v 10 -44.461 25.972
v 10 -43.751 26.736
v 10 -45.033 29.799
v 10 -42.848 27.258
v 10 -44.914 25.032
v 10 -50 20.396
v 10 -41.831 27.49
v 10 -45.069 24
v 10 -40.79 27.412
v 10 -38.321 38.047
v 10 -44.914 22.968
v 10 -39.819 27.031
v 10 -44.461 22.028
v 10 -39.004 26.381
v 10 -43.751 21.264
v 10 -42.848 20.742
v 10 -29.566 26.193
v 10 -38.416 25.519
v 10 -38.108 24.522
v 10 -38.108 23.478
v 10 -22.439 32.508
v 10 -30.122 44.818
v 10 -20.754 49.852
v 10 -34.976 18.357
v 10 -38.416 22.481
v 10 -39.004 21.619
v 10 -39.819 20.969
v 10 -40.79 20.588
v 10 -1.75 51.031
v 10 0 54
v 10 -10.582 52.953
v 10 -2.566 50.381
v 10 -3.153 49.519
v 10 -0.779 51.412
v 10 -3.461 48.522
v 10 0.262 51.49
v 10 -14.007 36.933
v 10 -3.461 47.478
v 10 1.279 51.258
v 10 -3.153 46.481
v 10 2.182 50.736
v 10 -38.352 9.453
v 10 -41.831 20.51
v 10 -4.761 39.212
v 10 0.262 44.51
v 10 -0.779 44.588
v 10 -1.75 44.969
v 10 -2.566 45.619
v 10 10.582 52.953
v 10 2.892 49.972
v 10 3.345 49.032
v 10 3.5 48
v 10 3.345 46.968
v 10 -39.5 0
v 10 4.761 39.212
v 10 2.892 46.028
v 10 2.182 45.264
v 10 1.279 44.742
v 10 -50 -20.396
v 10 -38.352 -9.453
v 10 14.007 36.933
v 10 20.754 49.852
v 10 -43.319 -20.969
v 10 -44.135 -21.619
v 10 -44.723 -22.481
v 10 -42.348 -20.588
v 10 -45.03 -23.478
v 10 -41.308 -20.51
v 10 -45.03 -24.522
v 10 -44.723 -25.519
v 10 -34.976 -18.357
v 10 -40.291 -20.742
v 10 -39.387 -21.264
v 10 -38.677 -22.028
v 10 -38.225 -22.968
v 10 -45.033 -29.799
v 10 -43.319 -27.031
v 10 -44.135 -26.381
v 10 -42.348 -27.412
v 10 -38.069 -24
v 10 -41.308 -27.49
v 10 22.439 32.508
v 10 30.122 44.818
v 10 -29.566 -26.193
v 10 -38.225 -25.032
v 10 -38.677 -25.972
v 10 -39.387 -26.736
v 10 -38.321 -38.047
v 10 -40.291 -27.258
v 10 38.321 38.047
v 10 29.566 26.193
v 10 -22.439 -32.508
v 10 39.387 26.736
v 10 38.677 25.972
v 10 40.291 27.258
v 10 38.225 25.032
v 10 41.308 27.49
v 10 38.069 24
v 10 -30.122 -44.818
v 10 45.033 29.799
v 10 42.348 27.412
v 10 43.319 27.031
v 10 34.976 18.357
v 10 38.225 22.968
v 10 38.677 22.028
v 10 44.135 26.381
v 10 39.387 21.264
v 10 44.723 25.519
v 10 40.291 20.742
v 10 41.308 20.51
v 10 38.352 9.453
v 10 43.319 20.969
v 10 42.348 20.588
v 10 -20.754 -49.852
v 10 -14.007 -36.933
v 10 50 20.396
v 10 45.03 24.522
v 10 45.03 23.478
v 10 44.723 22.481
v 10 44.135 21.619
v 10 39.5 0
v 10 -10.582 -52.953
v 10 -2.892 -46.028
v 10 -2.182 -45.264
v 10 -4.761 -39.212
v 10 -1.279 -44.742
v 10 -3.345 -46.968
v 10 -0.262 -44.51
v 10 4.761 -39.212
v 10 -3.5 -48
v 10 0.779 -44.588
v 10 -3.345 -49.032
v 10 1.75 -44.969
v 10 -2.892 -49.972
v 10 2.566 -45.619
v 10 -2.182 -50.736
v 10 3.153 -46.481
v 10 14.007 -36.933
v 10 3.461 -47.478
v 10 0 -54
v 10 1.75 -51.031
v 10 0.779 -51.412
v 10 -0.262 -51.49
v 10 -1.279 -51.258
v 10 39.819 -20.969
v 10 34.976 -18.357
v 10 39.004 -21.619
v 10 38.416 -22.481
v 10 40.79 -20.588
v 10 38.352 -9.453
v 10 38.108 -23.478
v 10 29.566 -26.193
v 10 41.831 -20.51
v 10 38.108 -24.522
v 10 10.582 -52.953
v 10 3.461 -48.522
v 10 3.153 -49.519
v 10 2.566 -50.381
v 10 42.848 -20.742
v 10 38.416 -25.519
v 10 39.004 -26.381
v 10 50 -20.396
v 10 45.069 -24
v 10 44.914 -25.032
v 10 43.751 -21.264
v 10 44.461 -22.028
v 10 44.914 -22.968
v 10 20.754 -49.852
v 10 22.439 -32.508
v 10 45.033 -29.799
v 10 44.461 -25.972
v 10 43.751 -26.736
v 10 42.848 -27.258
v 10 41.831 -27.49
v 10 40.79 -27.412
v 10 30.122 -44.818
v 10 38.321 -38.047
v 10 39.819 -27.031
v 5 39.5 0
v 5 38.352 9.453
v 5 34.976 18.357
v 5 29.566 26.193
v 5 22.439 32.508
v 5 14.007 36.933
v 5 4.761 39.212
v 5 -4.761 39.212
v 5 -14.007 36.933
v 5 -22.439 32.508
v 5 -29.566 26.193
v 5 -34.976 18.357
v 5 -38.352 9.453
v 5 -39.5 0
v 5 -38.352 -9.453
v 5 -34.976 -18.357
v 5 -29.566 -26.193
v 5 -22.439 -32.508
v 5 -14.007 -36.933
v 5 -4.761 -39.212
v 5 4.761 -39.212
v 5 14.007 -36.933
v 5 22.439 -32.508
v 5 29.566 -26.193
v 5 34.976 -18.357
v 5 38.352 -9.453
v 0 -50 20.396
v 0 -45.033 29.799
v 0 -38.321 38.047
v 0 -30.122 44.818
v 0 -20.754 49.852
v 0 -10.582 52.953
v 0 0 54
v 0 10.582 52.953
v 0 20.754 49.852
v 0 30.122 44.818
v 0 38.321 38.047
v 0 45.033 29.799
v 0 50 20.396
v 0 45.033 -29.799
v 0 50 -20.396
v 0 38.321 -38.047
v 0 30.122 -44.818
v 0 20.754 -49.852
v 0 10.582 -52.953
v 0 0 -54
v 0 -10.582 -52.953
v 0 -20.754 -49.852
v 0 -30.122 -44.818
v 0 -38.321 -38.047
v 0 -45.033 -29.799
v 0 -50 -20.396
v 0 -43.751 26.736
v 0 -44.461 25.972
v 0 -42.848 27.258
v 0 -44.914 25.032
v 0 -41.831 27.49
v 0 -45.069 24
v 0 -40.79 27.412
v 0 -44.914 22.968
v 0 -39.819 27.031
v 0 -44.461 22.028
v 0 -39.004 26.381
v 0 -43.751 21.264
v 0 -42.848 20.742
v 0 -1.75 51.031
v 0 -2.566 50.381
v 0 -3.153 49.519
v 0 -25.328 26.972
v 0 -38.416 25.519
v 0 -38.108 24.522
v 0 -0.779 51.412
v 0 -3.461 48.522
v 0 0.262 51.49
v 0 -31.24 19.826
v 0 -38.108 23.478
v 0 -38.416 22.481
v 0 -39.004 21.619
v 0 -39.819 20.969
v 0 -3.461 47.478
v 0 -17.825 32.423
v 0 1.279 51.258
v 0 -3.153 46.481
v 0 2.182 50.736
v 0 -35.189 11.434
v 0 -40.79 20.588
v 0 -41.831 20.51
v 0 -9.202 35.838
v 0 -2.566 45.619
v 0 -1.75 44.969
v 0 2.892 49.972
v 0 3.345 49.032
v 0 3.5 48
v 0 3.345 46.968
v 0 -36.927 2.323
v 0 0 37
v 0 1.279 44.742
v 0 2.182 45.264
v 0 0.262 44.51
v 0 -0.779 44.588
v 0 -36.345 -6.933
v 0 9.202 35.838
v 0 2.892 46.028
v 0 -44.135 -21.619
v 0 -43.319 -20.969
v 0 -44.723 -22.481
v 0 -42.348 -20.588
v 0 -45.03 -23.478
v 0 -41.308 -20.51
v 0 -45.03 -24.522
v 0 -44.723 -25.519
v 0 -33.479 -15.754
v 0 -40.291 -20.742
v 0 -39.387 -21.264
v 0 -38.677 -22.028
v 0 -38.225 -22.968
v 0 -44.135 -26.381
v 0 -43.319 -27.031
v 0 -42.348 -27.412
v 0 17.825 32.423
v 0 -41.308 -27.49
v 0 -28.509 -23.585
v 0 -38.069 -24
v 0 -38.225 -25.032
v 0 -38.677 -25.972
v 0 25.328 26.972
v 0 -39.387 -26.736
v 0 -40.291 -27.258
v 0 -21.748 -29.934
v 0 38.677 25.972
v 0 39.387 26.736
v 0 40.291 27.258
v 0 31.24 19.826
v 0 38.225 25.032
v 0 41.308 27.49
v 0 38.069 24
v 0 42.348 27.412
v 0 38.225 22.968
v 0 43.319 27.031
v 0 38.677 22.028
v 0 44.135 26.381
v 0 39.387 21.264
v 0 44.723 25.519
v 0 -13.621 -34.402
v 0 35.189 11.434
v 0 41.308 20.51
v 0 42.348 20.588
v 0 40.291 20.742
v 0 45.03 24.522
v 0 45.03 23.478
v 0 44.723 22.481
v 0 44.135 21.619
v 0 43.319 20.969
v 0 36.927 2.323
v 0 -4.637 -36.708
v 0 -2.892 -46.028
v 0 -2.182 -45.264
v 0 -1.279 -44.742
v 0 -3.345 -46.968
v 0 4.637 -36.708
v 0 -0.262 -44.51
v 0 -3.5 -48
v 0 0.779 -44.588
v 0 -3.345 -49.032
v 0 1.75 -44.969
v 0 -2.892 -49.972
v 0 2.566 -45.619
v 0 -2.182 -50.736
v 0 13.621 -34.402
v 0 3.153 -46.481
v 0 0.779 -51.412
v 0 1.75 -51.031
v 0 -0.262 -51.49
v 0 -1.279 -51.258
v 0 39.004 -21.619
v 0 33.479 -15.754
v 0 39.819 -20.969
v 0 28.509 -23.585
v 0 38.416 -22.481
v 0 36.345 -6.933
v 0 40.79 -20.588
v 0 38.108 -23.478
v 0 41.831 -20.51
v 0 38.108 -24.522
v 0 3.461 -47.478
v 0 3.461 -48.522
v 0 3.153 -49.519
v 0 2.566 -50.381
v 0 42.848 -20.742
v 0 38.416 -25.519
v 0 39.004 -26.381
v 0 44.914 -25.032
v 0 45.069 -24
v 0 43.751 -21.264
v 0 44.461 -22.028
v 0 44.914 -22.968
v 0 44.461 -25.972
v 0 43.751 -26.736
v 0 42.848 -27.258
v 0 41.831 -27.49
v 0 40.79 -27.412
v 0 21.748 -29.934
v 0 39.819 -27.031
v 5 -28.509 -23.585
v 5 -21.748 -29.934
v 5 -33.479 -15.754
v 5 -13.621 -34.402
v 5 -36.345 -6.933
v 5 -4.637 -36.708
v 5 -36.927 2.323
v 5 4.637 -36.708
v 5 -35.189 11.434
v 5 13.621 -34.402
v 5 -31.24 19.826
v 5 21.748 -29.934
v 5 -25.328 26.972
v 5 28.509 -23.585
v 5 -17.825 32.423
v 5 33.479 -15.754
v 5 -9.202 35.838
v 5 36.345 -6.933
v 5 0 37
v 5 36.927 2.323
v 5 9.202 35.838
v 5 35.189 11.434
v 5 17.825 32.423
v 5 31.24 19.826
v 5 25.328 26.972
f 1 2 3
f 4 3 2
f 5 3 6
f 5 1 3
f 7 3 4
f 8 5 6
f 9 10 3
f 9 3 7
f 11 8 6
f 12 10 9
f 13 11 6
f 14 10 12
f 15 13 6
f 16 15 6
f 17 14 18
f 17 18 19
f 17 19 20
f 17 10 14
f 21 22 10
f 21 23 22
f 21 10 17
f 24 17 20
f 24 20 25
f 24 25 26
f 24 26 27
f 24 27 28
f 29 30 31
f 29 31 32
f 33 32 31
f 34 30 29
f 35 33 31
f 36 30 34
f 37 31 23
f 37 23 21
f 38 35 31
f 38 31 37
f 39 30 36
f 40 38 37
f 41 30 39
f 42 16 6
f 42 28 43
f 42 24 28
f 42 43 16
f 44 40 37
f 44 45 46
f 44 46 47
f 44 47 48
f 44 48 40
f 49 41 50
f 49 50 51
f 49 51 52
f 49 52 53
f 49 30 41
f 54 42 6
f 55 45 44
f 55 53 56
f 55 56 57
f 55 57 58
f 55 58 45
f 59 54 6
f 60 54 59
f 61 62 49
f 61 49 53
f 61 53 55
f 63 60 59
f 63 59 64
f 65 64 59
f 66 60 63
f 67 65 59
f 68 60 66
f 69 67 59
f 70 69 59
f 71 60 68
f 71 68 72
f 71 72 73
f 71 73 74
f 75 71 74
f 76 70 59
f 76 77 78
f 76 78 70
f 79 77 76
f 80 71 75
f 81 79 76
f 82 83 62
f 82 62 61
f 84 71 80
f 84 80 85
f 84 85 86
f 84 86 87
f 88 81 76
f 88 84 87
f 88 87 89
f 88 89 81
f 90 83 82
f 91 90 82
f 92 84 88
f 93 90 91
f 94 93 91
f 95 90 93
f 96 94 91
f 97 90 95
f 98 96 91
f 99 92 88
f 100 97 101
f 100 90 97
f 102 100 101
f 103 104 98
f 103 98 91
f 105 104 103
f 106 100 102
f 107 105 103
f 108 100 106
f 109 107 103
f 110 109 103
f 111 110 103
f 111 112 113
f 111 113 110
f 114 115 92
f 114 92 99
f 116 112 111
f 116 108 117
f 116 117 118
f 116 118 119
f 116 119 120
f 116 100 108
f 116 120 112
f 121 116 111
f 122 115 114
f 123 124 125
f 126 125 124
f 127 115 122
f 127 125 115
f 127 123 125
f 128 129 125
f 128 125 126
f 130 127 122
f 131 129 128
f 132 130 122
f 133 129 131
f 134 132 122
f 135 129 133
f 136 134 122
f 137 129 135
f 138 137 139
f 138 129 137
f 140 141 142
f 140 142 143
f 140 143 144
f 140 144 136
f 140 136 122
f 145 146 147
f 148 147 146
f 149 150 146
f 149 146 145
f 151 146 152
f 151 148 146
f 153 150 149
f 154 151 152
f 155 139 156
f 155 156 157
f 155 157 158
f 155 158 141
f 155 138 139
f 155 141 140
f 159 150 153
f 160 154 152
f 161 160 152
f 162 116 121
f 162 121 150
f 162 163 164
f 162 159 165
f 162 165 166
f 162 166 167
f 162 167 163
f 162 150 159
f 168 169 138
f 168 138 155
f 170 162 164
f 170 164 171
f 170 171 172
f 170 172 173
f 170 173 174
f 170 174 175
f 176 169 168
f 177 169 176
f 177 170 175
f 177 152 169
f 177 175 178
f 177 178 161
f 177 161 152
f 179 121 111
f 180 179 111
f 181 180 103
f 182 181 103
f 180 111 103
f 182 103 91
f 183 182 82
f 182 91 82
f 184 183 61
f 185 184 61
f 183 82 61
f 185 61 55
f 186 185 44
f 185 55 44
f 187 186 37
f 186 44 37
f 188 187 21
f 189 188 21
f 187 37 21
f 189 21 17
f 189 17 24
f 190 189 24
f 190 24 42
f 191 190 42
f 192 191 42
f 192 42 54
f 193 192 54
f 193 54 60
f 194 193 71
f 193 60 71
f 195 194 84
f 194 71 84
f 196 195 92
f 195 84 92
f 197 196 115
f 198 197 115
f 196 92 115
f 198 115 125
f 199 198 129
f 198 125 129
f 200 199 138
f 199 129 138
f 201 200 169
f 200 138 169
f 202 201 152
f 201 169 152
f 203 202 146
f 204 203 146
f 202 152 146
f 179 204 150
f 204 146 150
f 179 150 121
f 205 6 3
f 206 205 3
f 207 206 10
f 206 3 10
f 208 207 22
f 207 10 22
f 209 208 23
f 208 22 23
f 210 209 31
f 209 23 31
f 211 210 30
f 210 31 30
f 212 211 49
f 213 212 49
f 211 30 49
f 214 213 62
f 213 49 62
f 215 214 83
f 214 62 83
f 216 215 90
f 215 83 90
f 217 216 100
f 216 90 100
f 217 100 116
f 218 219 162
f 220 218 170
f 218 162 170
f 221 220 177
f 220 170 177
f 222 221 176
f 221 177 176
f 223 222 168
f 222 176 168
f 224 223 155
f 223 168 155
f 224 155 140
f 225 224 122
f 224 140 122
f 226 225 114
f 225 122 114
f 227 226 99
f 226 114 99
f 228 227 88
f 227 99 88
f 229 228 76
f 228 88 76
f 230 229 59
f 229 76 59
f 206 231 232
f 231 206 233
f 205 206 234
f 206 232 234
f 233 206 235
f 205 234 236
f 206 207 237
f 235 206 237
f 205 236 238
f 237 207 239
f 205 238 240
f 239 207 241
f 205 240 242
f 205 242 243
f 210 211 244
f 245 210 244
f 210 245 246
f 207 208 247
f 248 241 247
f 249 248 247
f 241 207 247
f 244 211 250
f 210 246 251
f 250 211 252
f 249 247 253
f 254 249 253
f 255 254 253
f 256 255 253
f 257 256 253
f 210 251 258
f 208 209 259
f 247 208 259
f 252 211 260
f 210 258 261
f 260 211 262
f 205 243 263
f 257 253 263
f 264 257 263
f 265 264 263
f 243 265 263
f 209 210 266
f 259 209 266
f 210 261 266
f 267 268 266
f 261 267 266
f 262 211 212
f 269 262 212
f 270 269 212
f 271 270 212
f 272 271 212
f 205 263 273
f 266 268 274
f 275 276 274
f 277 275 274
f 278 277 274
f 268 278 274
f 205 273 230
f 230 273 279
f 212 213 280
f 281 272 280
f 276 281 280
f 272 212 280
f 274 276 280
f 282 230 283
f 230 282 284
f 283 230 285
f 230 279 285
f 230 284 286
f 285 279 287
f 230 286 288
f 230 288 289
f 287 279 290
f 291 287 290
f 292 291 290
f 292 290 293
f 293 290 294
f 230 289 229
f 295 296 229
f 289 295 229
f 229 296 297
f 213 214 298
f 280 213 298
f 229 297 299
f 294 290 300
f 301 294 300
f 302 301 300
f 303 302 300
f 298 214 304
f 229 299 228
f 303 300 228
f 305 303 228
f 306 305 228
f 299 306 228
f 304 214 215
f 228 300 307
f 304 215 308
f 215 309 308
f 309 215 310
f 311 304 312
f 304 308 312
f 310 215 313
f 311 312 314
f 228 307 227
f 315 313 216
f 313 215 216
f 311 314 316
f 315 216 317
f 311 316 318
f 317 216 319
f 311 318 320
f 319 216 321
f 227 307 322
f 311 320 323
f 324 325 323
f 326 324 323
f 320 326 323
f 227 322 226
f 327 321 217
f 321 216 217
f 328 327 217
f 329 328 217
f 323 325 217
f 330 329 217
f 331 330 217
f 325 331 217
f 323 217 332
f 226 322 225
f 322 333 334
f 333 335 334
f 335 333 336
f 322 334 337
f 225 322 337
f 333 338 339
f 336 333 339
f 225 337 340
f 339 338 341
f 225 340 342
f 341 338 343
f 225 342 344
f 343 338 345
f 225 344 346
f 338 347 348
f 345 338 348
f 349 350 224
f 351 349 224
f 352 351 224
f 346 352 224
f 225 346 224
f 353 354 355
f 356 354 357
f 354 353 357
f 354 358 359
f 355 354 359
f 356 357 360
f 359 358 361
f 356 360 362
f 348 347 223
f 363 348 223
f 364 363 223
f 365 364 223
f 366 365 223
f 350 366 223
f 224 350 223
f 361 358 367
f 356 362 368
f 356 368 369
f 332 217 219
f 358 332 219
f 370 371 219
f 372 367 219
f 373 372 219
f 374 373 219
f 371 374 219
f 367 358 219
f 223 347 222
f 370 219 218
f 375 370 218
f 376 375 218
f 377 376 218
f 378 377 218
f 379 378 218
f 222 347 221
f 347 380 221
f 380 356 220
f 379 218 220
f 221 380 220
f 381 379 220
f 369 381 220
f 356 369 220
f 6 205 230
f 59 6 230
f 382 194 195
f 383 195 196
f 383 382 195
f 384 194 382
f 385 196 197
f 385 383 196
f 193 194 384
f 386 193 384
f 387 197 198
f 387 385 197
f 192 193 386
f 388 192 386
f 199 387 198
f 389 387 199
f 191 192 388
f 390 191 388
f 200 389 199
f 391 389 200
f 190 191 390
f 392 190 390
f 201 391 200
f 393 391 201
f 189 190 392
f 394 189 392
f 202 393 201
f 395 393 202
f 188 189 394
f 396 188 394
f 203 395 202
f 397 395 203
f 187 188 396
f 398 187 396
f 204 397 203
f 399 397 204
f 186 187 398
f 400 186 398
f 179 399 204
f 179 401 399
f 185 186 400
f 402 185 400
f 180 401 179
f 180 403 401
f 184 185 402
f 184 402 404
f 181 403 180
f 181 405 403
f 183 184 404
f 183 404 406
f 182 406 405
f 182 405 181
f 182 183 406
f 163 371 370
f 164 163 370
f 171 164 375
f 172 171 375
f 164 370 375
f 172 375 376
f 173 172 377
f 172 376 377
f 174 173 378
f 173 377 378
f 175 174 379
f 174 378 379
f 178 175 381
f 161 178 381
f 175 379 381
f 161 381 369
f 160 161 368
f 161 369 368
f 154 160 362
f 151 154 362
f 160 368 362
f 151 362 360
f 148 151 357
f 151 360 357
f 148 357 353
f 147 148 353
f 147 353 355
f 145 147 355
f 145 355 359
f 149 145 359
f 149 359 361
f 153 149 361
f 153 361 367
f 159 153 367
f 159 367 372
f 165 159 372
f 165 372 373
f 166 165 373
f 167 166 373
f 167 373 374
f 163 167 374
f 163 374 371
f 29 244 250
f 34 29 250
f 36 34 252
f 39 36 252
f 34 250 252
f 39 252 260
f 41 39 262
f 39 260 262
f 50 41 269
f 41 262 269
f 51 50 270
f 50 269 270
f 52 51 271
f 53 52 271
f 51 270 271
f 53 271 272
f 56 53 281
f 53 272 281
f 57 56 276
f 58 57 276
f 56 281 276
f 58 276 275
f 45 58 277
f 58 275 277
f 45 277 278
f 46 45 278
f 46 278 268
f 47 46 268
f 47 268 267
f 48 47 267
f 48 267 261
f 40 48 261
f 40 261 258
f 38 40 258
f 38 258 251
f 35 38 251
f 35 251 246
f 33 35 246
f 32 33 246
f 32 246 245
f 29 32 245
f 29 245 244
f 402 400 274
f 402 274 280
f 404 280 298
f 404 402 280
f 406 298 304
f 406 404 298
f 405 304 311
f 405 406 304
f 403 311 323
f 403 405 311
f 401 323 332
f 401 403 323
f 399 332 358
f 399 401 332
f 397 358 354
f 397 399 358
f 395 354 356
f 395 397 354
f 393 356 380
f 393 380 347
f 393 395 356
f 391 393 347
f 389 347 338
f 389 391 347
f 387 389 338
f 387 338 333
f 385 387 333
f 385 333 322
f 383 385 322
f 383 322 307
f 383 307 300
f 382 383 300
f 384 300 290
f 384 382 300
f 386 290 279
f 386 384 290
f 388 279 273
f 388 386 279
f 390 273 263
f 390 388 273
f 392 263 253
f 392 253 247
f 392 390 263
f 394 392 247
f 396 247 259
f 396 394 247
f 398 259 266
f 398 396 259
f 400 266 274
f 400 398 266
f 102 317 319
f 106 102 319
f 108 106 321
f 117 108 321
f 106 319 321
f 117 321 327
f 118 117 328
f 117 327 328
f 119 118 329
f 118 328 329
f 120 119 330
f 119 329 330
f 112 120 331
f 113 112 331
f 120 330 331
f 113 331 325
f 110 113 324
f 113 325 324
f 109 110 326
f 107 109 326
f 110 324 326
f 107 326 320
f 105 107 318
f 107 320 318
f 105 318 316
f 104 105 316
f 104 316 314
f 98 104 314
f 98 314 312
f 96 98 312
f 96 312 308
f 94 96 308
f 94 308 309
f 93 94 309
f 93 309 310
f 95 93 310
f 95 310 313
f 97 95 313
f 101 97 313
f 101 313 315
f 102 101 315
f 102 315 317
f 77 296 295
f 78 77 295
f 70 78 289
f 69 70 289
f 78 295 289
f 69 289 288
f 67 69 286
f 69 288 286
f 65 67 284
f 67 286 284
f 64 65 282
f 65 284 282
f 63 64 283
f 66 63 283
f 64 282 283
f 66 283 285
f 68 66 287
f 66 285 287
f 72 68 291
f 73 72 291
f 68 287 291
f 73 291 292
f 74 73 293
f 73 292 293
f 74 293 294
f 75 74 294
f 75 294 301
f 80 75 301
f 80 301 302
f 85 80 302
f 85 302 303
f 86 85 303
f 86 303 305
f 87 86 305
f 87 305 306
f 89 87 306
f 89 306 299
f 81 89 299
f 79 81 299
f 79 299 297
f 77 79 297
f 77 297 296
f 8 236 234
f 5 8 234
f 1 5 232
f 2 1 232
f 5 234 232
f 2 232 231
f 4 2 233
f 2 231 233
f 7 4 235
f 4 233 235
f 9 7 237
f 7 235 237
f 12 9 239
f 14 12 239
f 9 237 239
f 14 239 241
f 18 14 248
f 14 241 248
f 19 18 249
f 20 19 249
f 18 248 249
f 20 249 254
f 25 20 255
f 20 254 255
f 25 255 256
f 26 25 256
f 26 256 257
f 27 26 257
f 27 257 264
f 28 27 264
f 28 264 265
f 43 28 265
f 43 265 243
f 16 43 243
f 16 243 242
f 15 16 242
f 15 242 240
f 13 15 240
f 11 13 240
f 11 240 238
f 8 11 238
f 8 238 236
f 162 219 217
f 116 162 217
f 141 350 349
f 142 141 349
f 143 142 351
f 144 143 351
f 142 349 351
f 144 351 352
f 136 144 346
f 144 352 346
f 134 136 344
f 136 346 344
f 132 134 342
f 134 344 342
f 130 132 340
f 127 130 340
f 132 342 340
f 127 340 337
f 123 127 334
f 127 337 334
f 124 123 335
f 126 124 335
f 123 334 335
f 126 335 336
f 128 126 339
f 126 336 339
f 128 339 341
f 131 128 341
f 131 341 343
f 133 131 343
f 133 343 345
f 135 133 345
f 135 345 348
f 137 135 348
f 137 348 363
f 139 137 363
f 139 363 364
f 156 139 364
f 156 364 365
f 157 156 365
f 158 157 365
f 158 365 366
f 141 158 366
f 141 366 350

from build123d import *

# Parameters (mm, degrees)
F0_W            = 10
F0_H            = 17
F2_R            = 3.5
F3_DEPTH        = 10.001
F3_COPIES_COUNT = 6
F5_DEPTH        = 10.001
F6_R            = 39.5
F6_R_2          = 37
F7_DEPTH        = 5


# Not quite as in the source:
# - a pattern or mirror of a feature is missing from the dataset's text; its kind, count and spacing are read off the source's solid


with BuildPart() as f1:
    # F0 (on Front) → F1 (revolve)
    with BuildSketch(Plane.XZ):
        with Locations((5, 45.5)):
            Rectangle(F0_W, F0_H)
    revolve(axis=Axis((-28.7704151153, 0, 0), (-1, 0, 0)))

    # F2 (on face) → F3 (cut, through all)
    with BuildSketch(Plane(origin=(0, 0, 0), x_dir=(0, -1, 0), z_dir=(-1, 0, 0))):
        with Locations((41.5692193817, 24)):
            Circle(F2_R)
    f3 = extrude(amount=-F3_DEPTH, mode=Mode.SUBTRACT)

    # F3_copies: F3 ×6 about axis
    f3_copies_axis = Axis((0, 0, 0), (1, 0, 0))
    for i in range(1, F3_COPIES_COUNT):
        add(f3.rotate(f3_copies_axis, i * 360 / F3_COPIES_COUNT), mode=Mode.SUBTRACT)

    # F4 (on face) → F5 (cut, through all)
    with BuildSketch(Plane(origin=(0, 0, 0), x_dir=(0, -1, 0), z_dir=(-1, 0, 0))):
        with BuildLine():
            Line((-50, -20.3960780544), (-50, 20.3960780544))
            ThreePointArc((-50, 20.3960780544), (-54, 0), (-50, -20.3960780544))
        make_face()
        with BuildLine():
            ThreePointArc((54, 0), (52.990565198, 10.3923048454), (50, 20.3960780544))
            Line((50, 20.3960780544), (50, -20.3960780544))
            ThreePointArc((50, -20.3960780544), (52.990565198, -10.3923048454), (54, 0))
        make_face()
    extrude(amount=-F5_DEPTH, mode=Mode.SUBTRACT)

    # F6 (on face) → F7 (cut)
    with BuildSketch(Plane.YZ.offset(10)):
        Circle(F6_R)
        Circle(F6_R_2, mode=Mode.SUBTRACT)
    extrude(amount=-F7_DEPTH, mode=Mode.SUBTRACT)


solid = f1.part
